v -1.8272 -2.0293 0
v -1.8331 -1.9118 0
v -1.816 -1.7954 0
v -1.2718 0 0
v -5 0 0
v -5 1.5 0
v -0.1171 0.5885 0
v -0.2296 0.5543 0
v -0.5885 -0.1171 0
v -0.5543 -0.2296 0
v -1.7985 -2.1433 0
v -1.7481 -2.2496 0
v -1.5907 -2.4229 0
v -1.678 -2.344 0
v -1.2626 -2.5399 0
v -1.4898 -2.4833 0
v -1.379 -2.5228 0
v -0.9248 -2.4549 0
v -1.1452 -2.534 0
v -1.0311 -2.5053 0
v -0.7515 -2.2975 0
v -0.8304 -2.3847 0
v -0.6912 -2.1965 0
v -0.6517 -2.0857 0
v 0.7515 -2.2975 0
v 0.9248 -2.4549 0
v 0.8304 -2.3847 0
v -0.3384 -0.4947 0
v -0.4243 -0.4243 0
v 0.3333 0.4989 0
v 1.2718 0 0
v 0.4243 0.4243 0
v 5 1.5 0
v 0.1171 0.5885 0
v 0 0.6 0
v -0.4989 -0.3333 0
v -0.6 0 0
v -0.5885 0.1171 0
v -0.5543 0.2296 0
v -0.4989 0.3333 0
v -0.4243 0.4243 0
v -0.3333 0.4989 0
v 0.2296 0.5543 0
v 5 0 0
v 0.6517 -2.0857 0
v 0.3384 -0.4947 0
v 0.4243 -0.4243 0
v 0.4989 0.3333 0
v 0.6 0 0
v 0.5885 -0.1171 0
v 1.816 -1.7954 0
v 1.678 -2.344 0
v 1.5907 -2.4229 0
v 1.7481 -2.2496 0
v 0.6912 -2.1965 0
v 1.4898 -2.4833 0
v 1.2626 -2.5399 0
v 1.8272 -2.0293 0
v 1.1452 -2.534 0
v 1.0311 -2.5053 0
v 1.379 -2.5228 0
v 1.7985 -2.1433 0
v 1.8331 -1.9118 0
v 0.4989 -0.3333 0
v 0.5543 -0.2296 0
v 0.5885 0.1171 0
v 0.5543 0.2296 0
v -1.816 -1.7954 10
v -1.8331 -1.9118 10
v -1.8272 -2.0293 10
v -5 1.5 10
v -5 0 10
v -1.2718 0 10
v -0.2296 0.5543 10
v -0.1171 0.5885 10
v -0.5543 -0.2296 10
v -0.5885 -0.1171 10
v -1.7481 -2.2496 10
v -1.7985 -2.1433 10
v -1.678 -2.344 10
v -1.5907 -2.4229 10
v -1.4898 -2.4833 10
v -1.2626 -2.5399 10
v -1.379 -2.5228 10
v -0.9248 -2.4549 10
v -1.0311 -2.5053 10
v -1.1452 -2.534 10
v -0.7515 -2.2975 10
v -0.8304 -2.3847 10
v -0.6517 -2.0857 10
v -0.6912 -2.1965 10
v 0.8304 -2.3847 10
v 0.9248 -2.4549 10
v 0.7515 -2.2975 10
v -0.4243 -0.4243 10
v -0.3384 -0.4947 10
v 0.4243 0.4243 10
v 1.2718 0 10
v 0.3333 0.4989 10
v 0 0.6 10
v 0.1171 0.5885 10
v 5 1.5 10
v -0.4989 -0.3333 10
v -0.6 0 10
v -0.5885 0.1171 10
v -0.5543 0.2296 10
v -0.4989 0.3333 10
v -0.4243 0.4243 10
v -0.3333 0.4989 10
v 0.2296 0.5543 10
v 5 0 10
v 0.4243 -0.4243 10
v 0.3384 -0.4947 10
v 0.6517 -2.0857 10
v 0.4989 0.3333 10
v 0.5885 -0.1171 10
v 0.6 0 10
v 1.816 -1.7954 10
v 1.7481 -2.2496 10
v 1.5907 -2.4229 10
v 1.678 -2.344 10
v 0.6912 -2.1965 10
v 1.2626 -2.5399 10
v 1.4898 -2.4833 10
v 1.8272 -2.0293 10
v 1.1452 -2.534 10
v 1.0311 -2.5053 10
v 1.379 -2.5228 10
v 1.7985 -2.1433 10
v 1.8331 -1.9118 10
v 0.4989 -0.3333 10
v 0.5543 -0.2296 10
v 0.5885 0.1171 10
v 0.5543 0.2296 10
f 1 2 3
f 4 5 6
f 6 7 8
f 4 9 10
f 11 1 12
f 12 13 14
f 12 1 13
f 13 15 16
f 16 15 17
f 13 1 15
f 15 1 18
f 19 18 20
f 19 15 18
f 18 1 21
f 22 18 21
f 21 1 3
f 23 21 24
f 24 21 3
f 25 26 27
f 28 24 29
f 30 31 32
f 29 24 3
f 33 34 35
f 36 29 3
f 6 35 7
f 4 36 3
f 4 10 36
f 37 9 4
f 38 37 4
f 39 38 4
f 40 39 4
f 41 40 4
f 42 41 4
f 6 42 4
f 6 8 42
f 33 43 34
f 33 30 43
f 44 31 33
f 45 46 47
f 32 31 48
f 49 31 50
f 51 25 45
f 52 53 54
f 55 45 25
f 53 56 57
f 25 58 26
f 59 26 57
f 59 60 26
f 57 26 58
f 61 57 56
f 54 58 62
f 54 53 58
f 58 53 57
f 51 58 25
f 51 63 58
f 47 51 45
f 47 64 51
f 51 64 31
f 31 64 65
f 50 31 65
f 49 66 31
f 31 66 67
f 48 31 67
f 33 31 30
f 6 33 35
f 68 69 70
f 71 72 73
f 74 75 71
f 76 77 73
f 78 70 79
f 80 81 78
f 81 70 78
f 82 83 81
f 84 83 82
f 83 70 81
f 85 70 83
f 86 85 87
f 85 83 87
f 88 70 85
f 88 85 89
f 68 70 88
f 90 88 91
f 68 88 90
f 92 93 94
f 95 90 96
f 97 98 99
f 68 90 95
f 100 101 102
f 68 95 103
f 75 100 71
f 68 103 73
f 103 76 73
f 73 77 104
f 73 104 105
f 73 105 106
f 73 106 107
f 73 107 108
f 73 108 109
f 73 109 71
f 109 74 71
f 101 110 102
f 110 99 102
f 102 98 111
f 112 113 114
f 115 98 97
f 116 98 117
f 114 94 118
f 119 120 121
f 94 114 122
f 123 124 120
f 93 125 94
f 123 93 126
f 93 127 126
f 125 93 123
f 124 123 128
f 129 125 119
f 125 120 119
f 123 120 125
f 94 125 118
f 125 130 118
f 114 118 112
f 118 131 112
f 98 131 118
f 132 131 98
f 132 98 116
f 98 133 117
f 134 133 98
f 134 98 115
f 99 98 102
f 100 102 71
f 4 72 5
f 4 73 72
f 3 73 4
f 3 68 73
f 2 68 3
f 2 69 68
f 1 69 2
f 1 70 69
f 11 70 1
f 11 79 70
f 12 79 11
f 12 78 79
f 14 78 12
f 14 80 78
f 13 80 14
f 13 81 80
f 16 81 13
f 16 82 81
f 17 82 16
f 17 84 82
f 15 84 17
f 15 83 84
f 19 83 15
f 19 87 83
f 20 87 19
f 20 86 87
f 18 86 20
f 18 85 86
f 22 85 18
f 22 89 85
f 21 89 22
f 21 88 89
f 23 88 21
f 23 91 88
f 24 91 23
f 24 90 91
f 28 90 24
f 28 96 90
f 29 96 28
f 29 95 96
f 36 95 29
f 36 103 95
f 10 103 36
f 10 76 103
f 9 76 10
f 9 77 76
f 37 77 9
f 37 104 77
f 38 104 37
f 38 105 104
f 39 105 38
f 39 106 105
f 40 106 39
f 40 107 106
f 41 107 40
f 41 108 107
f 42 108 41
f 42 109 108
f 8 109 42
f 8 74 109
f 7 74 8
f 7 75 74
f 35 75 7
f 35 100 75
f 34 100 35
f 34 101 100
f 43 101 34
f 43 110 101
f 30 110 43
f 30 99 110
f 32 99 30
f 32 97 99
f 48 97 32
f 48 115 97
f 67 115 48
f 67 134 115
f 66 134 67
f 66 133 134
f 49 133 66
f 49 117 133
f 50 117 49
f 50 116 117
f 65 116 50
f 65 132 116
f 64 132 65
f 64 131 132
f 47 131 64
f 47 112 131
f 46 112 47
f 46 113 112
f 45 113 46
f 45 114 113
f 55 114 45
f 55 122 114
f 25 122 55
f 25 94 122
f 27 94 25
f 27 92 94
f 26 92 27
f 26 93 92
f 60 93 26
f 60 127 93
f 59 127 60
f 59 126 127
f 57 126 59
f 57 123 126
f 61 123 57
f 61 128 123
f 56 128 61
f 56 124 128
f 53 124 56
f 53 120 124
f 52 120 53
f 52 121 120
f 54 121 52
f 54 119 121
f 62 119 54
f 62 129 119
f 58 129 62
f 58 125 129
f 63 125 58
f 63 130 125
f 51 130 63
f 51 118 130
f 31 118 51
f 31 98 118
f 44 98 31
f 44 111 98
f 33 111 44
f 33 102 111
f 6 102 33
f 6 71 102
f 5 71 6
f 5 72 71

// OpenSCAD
// based on: https://www.thingiverse.com/thing:783810

// make circles higher resolution
$fn = 32;

module stay(thickness = 0.5, bulging = 1.2, protrusion = 2, slant = 14) {
	// slant the stay for clipping into beam
	rotate([0, 0, slant])
		// use hull of two circles as cross-section of stay
		hull() {
			circle(r=thickness, center=true);
			translate([0, -protrusion, 0])
				// stay is bulging a bit at the inner end -
				// because we can! :)
				circle(r=thickness * bulging, center=true);
		}
}

module half_clip(width = 10,
		flex_channel_radius = 0.6,
		stay_thickness = 0.5, stay_pressure_fudge = 0.35,
		plate_thickness = 1.5,
		ob_channel_width = 3.2) {
	difference() {
		union() {
			// backing plate
			square([width/2, plate_thickness]);
			// stay that clips into channel
			translate([ob_channel_width/2 - stay_thickness - stay_pressure_fudge, 0, 0])
				stay(stay_thickness);
		}

		// cut-out in backing plate and stay to allow flexing
		circle(r=flex_channel_radius, center=true);
	}
}

module clip(width = 10, height = 10) {
	linear_extrude(height)
		union() {
			// two half-clips back-to-back
			half_clip(width);
			mirror([1, 0, 0])
				half_clip(width);
		}
}

clip();
